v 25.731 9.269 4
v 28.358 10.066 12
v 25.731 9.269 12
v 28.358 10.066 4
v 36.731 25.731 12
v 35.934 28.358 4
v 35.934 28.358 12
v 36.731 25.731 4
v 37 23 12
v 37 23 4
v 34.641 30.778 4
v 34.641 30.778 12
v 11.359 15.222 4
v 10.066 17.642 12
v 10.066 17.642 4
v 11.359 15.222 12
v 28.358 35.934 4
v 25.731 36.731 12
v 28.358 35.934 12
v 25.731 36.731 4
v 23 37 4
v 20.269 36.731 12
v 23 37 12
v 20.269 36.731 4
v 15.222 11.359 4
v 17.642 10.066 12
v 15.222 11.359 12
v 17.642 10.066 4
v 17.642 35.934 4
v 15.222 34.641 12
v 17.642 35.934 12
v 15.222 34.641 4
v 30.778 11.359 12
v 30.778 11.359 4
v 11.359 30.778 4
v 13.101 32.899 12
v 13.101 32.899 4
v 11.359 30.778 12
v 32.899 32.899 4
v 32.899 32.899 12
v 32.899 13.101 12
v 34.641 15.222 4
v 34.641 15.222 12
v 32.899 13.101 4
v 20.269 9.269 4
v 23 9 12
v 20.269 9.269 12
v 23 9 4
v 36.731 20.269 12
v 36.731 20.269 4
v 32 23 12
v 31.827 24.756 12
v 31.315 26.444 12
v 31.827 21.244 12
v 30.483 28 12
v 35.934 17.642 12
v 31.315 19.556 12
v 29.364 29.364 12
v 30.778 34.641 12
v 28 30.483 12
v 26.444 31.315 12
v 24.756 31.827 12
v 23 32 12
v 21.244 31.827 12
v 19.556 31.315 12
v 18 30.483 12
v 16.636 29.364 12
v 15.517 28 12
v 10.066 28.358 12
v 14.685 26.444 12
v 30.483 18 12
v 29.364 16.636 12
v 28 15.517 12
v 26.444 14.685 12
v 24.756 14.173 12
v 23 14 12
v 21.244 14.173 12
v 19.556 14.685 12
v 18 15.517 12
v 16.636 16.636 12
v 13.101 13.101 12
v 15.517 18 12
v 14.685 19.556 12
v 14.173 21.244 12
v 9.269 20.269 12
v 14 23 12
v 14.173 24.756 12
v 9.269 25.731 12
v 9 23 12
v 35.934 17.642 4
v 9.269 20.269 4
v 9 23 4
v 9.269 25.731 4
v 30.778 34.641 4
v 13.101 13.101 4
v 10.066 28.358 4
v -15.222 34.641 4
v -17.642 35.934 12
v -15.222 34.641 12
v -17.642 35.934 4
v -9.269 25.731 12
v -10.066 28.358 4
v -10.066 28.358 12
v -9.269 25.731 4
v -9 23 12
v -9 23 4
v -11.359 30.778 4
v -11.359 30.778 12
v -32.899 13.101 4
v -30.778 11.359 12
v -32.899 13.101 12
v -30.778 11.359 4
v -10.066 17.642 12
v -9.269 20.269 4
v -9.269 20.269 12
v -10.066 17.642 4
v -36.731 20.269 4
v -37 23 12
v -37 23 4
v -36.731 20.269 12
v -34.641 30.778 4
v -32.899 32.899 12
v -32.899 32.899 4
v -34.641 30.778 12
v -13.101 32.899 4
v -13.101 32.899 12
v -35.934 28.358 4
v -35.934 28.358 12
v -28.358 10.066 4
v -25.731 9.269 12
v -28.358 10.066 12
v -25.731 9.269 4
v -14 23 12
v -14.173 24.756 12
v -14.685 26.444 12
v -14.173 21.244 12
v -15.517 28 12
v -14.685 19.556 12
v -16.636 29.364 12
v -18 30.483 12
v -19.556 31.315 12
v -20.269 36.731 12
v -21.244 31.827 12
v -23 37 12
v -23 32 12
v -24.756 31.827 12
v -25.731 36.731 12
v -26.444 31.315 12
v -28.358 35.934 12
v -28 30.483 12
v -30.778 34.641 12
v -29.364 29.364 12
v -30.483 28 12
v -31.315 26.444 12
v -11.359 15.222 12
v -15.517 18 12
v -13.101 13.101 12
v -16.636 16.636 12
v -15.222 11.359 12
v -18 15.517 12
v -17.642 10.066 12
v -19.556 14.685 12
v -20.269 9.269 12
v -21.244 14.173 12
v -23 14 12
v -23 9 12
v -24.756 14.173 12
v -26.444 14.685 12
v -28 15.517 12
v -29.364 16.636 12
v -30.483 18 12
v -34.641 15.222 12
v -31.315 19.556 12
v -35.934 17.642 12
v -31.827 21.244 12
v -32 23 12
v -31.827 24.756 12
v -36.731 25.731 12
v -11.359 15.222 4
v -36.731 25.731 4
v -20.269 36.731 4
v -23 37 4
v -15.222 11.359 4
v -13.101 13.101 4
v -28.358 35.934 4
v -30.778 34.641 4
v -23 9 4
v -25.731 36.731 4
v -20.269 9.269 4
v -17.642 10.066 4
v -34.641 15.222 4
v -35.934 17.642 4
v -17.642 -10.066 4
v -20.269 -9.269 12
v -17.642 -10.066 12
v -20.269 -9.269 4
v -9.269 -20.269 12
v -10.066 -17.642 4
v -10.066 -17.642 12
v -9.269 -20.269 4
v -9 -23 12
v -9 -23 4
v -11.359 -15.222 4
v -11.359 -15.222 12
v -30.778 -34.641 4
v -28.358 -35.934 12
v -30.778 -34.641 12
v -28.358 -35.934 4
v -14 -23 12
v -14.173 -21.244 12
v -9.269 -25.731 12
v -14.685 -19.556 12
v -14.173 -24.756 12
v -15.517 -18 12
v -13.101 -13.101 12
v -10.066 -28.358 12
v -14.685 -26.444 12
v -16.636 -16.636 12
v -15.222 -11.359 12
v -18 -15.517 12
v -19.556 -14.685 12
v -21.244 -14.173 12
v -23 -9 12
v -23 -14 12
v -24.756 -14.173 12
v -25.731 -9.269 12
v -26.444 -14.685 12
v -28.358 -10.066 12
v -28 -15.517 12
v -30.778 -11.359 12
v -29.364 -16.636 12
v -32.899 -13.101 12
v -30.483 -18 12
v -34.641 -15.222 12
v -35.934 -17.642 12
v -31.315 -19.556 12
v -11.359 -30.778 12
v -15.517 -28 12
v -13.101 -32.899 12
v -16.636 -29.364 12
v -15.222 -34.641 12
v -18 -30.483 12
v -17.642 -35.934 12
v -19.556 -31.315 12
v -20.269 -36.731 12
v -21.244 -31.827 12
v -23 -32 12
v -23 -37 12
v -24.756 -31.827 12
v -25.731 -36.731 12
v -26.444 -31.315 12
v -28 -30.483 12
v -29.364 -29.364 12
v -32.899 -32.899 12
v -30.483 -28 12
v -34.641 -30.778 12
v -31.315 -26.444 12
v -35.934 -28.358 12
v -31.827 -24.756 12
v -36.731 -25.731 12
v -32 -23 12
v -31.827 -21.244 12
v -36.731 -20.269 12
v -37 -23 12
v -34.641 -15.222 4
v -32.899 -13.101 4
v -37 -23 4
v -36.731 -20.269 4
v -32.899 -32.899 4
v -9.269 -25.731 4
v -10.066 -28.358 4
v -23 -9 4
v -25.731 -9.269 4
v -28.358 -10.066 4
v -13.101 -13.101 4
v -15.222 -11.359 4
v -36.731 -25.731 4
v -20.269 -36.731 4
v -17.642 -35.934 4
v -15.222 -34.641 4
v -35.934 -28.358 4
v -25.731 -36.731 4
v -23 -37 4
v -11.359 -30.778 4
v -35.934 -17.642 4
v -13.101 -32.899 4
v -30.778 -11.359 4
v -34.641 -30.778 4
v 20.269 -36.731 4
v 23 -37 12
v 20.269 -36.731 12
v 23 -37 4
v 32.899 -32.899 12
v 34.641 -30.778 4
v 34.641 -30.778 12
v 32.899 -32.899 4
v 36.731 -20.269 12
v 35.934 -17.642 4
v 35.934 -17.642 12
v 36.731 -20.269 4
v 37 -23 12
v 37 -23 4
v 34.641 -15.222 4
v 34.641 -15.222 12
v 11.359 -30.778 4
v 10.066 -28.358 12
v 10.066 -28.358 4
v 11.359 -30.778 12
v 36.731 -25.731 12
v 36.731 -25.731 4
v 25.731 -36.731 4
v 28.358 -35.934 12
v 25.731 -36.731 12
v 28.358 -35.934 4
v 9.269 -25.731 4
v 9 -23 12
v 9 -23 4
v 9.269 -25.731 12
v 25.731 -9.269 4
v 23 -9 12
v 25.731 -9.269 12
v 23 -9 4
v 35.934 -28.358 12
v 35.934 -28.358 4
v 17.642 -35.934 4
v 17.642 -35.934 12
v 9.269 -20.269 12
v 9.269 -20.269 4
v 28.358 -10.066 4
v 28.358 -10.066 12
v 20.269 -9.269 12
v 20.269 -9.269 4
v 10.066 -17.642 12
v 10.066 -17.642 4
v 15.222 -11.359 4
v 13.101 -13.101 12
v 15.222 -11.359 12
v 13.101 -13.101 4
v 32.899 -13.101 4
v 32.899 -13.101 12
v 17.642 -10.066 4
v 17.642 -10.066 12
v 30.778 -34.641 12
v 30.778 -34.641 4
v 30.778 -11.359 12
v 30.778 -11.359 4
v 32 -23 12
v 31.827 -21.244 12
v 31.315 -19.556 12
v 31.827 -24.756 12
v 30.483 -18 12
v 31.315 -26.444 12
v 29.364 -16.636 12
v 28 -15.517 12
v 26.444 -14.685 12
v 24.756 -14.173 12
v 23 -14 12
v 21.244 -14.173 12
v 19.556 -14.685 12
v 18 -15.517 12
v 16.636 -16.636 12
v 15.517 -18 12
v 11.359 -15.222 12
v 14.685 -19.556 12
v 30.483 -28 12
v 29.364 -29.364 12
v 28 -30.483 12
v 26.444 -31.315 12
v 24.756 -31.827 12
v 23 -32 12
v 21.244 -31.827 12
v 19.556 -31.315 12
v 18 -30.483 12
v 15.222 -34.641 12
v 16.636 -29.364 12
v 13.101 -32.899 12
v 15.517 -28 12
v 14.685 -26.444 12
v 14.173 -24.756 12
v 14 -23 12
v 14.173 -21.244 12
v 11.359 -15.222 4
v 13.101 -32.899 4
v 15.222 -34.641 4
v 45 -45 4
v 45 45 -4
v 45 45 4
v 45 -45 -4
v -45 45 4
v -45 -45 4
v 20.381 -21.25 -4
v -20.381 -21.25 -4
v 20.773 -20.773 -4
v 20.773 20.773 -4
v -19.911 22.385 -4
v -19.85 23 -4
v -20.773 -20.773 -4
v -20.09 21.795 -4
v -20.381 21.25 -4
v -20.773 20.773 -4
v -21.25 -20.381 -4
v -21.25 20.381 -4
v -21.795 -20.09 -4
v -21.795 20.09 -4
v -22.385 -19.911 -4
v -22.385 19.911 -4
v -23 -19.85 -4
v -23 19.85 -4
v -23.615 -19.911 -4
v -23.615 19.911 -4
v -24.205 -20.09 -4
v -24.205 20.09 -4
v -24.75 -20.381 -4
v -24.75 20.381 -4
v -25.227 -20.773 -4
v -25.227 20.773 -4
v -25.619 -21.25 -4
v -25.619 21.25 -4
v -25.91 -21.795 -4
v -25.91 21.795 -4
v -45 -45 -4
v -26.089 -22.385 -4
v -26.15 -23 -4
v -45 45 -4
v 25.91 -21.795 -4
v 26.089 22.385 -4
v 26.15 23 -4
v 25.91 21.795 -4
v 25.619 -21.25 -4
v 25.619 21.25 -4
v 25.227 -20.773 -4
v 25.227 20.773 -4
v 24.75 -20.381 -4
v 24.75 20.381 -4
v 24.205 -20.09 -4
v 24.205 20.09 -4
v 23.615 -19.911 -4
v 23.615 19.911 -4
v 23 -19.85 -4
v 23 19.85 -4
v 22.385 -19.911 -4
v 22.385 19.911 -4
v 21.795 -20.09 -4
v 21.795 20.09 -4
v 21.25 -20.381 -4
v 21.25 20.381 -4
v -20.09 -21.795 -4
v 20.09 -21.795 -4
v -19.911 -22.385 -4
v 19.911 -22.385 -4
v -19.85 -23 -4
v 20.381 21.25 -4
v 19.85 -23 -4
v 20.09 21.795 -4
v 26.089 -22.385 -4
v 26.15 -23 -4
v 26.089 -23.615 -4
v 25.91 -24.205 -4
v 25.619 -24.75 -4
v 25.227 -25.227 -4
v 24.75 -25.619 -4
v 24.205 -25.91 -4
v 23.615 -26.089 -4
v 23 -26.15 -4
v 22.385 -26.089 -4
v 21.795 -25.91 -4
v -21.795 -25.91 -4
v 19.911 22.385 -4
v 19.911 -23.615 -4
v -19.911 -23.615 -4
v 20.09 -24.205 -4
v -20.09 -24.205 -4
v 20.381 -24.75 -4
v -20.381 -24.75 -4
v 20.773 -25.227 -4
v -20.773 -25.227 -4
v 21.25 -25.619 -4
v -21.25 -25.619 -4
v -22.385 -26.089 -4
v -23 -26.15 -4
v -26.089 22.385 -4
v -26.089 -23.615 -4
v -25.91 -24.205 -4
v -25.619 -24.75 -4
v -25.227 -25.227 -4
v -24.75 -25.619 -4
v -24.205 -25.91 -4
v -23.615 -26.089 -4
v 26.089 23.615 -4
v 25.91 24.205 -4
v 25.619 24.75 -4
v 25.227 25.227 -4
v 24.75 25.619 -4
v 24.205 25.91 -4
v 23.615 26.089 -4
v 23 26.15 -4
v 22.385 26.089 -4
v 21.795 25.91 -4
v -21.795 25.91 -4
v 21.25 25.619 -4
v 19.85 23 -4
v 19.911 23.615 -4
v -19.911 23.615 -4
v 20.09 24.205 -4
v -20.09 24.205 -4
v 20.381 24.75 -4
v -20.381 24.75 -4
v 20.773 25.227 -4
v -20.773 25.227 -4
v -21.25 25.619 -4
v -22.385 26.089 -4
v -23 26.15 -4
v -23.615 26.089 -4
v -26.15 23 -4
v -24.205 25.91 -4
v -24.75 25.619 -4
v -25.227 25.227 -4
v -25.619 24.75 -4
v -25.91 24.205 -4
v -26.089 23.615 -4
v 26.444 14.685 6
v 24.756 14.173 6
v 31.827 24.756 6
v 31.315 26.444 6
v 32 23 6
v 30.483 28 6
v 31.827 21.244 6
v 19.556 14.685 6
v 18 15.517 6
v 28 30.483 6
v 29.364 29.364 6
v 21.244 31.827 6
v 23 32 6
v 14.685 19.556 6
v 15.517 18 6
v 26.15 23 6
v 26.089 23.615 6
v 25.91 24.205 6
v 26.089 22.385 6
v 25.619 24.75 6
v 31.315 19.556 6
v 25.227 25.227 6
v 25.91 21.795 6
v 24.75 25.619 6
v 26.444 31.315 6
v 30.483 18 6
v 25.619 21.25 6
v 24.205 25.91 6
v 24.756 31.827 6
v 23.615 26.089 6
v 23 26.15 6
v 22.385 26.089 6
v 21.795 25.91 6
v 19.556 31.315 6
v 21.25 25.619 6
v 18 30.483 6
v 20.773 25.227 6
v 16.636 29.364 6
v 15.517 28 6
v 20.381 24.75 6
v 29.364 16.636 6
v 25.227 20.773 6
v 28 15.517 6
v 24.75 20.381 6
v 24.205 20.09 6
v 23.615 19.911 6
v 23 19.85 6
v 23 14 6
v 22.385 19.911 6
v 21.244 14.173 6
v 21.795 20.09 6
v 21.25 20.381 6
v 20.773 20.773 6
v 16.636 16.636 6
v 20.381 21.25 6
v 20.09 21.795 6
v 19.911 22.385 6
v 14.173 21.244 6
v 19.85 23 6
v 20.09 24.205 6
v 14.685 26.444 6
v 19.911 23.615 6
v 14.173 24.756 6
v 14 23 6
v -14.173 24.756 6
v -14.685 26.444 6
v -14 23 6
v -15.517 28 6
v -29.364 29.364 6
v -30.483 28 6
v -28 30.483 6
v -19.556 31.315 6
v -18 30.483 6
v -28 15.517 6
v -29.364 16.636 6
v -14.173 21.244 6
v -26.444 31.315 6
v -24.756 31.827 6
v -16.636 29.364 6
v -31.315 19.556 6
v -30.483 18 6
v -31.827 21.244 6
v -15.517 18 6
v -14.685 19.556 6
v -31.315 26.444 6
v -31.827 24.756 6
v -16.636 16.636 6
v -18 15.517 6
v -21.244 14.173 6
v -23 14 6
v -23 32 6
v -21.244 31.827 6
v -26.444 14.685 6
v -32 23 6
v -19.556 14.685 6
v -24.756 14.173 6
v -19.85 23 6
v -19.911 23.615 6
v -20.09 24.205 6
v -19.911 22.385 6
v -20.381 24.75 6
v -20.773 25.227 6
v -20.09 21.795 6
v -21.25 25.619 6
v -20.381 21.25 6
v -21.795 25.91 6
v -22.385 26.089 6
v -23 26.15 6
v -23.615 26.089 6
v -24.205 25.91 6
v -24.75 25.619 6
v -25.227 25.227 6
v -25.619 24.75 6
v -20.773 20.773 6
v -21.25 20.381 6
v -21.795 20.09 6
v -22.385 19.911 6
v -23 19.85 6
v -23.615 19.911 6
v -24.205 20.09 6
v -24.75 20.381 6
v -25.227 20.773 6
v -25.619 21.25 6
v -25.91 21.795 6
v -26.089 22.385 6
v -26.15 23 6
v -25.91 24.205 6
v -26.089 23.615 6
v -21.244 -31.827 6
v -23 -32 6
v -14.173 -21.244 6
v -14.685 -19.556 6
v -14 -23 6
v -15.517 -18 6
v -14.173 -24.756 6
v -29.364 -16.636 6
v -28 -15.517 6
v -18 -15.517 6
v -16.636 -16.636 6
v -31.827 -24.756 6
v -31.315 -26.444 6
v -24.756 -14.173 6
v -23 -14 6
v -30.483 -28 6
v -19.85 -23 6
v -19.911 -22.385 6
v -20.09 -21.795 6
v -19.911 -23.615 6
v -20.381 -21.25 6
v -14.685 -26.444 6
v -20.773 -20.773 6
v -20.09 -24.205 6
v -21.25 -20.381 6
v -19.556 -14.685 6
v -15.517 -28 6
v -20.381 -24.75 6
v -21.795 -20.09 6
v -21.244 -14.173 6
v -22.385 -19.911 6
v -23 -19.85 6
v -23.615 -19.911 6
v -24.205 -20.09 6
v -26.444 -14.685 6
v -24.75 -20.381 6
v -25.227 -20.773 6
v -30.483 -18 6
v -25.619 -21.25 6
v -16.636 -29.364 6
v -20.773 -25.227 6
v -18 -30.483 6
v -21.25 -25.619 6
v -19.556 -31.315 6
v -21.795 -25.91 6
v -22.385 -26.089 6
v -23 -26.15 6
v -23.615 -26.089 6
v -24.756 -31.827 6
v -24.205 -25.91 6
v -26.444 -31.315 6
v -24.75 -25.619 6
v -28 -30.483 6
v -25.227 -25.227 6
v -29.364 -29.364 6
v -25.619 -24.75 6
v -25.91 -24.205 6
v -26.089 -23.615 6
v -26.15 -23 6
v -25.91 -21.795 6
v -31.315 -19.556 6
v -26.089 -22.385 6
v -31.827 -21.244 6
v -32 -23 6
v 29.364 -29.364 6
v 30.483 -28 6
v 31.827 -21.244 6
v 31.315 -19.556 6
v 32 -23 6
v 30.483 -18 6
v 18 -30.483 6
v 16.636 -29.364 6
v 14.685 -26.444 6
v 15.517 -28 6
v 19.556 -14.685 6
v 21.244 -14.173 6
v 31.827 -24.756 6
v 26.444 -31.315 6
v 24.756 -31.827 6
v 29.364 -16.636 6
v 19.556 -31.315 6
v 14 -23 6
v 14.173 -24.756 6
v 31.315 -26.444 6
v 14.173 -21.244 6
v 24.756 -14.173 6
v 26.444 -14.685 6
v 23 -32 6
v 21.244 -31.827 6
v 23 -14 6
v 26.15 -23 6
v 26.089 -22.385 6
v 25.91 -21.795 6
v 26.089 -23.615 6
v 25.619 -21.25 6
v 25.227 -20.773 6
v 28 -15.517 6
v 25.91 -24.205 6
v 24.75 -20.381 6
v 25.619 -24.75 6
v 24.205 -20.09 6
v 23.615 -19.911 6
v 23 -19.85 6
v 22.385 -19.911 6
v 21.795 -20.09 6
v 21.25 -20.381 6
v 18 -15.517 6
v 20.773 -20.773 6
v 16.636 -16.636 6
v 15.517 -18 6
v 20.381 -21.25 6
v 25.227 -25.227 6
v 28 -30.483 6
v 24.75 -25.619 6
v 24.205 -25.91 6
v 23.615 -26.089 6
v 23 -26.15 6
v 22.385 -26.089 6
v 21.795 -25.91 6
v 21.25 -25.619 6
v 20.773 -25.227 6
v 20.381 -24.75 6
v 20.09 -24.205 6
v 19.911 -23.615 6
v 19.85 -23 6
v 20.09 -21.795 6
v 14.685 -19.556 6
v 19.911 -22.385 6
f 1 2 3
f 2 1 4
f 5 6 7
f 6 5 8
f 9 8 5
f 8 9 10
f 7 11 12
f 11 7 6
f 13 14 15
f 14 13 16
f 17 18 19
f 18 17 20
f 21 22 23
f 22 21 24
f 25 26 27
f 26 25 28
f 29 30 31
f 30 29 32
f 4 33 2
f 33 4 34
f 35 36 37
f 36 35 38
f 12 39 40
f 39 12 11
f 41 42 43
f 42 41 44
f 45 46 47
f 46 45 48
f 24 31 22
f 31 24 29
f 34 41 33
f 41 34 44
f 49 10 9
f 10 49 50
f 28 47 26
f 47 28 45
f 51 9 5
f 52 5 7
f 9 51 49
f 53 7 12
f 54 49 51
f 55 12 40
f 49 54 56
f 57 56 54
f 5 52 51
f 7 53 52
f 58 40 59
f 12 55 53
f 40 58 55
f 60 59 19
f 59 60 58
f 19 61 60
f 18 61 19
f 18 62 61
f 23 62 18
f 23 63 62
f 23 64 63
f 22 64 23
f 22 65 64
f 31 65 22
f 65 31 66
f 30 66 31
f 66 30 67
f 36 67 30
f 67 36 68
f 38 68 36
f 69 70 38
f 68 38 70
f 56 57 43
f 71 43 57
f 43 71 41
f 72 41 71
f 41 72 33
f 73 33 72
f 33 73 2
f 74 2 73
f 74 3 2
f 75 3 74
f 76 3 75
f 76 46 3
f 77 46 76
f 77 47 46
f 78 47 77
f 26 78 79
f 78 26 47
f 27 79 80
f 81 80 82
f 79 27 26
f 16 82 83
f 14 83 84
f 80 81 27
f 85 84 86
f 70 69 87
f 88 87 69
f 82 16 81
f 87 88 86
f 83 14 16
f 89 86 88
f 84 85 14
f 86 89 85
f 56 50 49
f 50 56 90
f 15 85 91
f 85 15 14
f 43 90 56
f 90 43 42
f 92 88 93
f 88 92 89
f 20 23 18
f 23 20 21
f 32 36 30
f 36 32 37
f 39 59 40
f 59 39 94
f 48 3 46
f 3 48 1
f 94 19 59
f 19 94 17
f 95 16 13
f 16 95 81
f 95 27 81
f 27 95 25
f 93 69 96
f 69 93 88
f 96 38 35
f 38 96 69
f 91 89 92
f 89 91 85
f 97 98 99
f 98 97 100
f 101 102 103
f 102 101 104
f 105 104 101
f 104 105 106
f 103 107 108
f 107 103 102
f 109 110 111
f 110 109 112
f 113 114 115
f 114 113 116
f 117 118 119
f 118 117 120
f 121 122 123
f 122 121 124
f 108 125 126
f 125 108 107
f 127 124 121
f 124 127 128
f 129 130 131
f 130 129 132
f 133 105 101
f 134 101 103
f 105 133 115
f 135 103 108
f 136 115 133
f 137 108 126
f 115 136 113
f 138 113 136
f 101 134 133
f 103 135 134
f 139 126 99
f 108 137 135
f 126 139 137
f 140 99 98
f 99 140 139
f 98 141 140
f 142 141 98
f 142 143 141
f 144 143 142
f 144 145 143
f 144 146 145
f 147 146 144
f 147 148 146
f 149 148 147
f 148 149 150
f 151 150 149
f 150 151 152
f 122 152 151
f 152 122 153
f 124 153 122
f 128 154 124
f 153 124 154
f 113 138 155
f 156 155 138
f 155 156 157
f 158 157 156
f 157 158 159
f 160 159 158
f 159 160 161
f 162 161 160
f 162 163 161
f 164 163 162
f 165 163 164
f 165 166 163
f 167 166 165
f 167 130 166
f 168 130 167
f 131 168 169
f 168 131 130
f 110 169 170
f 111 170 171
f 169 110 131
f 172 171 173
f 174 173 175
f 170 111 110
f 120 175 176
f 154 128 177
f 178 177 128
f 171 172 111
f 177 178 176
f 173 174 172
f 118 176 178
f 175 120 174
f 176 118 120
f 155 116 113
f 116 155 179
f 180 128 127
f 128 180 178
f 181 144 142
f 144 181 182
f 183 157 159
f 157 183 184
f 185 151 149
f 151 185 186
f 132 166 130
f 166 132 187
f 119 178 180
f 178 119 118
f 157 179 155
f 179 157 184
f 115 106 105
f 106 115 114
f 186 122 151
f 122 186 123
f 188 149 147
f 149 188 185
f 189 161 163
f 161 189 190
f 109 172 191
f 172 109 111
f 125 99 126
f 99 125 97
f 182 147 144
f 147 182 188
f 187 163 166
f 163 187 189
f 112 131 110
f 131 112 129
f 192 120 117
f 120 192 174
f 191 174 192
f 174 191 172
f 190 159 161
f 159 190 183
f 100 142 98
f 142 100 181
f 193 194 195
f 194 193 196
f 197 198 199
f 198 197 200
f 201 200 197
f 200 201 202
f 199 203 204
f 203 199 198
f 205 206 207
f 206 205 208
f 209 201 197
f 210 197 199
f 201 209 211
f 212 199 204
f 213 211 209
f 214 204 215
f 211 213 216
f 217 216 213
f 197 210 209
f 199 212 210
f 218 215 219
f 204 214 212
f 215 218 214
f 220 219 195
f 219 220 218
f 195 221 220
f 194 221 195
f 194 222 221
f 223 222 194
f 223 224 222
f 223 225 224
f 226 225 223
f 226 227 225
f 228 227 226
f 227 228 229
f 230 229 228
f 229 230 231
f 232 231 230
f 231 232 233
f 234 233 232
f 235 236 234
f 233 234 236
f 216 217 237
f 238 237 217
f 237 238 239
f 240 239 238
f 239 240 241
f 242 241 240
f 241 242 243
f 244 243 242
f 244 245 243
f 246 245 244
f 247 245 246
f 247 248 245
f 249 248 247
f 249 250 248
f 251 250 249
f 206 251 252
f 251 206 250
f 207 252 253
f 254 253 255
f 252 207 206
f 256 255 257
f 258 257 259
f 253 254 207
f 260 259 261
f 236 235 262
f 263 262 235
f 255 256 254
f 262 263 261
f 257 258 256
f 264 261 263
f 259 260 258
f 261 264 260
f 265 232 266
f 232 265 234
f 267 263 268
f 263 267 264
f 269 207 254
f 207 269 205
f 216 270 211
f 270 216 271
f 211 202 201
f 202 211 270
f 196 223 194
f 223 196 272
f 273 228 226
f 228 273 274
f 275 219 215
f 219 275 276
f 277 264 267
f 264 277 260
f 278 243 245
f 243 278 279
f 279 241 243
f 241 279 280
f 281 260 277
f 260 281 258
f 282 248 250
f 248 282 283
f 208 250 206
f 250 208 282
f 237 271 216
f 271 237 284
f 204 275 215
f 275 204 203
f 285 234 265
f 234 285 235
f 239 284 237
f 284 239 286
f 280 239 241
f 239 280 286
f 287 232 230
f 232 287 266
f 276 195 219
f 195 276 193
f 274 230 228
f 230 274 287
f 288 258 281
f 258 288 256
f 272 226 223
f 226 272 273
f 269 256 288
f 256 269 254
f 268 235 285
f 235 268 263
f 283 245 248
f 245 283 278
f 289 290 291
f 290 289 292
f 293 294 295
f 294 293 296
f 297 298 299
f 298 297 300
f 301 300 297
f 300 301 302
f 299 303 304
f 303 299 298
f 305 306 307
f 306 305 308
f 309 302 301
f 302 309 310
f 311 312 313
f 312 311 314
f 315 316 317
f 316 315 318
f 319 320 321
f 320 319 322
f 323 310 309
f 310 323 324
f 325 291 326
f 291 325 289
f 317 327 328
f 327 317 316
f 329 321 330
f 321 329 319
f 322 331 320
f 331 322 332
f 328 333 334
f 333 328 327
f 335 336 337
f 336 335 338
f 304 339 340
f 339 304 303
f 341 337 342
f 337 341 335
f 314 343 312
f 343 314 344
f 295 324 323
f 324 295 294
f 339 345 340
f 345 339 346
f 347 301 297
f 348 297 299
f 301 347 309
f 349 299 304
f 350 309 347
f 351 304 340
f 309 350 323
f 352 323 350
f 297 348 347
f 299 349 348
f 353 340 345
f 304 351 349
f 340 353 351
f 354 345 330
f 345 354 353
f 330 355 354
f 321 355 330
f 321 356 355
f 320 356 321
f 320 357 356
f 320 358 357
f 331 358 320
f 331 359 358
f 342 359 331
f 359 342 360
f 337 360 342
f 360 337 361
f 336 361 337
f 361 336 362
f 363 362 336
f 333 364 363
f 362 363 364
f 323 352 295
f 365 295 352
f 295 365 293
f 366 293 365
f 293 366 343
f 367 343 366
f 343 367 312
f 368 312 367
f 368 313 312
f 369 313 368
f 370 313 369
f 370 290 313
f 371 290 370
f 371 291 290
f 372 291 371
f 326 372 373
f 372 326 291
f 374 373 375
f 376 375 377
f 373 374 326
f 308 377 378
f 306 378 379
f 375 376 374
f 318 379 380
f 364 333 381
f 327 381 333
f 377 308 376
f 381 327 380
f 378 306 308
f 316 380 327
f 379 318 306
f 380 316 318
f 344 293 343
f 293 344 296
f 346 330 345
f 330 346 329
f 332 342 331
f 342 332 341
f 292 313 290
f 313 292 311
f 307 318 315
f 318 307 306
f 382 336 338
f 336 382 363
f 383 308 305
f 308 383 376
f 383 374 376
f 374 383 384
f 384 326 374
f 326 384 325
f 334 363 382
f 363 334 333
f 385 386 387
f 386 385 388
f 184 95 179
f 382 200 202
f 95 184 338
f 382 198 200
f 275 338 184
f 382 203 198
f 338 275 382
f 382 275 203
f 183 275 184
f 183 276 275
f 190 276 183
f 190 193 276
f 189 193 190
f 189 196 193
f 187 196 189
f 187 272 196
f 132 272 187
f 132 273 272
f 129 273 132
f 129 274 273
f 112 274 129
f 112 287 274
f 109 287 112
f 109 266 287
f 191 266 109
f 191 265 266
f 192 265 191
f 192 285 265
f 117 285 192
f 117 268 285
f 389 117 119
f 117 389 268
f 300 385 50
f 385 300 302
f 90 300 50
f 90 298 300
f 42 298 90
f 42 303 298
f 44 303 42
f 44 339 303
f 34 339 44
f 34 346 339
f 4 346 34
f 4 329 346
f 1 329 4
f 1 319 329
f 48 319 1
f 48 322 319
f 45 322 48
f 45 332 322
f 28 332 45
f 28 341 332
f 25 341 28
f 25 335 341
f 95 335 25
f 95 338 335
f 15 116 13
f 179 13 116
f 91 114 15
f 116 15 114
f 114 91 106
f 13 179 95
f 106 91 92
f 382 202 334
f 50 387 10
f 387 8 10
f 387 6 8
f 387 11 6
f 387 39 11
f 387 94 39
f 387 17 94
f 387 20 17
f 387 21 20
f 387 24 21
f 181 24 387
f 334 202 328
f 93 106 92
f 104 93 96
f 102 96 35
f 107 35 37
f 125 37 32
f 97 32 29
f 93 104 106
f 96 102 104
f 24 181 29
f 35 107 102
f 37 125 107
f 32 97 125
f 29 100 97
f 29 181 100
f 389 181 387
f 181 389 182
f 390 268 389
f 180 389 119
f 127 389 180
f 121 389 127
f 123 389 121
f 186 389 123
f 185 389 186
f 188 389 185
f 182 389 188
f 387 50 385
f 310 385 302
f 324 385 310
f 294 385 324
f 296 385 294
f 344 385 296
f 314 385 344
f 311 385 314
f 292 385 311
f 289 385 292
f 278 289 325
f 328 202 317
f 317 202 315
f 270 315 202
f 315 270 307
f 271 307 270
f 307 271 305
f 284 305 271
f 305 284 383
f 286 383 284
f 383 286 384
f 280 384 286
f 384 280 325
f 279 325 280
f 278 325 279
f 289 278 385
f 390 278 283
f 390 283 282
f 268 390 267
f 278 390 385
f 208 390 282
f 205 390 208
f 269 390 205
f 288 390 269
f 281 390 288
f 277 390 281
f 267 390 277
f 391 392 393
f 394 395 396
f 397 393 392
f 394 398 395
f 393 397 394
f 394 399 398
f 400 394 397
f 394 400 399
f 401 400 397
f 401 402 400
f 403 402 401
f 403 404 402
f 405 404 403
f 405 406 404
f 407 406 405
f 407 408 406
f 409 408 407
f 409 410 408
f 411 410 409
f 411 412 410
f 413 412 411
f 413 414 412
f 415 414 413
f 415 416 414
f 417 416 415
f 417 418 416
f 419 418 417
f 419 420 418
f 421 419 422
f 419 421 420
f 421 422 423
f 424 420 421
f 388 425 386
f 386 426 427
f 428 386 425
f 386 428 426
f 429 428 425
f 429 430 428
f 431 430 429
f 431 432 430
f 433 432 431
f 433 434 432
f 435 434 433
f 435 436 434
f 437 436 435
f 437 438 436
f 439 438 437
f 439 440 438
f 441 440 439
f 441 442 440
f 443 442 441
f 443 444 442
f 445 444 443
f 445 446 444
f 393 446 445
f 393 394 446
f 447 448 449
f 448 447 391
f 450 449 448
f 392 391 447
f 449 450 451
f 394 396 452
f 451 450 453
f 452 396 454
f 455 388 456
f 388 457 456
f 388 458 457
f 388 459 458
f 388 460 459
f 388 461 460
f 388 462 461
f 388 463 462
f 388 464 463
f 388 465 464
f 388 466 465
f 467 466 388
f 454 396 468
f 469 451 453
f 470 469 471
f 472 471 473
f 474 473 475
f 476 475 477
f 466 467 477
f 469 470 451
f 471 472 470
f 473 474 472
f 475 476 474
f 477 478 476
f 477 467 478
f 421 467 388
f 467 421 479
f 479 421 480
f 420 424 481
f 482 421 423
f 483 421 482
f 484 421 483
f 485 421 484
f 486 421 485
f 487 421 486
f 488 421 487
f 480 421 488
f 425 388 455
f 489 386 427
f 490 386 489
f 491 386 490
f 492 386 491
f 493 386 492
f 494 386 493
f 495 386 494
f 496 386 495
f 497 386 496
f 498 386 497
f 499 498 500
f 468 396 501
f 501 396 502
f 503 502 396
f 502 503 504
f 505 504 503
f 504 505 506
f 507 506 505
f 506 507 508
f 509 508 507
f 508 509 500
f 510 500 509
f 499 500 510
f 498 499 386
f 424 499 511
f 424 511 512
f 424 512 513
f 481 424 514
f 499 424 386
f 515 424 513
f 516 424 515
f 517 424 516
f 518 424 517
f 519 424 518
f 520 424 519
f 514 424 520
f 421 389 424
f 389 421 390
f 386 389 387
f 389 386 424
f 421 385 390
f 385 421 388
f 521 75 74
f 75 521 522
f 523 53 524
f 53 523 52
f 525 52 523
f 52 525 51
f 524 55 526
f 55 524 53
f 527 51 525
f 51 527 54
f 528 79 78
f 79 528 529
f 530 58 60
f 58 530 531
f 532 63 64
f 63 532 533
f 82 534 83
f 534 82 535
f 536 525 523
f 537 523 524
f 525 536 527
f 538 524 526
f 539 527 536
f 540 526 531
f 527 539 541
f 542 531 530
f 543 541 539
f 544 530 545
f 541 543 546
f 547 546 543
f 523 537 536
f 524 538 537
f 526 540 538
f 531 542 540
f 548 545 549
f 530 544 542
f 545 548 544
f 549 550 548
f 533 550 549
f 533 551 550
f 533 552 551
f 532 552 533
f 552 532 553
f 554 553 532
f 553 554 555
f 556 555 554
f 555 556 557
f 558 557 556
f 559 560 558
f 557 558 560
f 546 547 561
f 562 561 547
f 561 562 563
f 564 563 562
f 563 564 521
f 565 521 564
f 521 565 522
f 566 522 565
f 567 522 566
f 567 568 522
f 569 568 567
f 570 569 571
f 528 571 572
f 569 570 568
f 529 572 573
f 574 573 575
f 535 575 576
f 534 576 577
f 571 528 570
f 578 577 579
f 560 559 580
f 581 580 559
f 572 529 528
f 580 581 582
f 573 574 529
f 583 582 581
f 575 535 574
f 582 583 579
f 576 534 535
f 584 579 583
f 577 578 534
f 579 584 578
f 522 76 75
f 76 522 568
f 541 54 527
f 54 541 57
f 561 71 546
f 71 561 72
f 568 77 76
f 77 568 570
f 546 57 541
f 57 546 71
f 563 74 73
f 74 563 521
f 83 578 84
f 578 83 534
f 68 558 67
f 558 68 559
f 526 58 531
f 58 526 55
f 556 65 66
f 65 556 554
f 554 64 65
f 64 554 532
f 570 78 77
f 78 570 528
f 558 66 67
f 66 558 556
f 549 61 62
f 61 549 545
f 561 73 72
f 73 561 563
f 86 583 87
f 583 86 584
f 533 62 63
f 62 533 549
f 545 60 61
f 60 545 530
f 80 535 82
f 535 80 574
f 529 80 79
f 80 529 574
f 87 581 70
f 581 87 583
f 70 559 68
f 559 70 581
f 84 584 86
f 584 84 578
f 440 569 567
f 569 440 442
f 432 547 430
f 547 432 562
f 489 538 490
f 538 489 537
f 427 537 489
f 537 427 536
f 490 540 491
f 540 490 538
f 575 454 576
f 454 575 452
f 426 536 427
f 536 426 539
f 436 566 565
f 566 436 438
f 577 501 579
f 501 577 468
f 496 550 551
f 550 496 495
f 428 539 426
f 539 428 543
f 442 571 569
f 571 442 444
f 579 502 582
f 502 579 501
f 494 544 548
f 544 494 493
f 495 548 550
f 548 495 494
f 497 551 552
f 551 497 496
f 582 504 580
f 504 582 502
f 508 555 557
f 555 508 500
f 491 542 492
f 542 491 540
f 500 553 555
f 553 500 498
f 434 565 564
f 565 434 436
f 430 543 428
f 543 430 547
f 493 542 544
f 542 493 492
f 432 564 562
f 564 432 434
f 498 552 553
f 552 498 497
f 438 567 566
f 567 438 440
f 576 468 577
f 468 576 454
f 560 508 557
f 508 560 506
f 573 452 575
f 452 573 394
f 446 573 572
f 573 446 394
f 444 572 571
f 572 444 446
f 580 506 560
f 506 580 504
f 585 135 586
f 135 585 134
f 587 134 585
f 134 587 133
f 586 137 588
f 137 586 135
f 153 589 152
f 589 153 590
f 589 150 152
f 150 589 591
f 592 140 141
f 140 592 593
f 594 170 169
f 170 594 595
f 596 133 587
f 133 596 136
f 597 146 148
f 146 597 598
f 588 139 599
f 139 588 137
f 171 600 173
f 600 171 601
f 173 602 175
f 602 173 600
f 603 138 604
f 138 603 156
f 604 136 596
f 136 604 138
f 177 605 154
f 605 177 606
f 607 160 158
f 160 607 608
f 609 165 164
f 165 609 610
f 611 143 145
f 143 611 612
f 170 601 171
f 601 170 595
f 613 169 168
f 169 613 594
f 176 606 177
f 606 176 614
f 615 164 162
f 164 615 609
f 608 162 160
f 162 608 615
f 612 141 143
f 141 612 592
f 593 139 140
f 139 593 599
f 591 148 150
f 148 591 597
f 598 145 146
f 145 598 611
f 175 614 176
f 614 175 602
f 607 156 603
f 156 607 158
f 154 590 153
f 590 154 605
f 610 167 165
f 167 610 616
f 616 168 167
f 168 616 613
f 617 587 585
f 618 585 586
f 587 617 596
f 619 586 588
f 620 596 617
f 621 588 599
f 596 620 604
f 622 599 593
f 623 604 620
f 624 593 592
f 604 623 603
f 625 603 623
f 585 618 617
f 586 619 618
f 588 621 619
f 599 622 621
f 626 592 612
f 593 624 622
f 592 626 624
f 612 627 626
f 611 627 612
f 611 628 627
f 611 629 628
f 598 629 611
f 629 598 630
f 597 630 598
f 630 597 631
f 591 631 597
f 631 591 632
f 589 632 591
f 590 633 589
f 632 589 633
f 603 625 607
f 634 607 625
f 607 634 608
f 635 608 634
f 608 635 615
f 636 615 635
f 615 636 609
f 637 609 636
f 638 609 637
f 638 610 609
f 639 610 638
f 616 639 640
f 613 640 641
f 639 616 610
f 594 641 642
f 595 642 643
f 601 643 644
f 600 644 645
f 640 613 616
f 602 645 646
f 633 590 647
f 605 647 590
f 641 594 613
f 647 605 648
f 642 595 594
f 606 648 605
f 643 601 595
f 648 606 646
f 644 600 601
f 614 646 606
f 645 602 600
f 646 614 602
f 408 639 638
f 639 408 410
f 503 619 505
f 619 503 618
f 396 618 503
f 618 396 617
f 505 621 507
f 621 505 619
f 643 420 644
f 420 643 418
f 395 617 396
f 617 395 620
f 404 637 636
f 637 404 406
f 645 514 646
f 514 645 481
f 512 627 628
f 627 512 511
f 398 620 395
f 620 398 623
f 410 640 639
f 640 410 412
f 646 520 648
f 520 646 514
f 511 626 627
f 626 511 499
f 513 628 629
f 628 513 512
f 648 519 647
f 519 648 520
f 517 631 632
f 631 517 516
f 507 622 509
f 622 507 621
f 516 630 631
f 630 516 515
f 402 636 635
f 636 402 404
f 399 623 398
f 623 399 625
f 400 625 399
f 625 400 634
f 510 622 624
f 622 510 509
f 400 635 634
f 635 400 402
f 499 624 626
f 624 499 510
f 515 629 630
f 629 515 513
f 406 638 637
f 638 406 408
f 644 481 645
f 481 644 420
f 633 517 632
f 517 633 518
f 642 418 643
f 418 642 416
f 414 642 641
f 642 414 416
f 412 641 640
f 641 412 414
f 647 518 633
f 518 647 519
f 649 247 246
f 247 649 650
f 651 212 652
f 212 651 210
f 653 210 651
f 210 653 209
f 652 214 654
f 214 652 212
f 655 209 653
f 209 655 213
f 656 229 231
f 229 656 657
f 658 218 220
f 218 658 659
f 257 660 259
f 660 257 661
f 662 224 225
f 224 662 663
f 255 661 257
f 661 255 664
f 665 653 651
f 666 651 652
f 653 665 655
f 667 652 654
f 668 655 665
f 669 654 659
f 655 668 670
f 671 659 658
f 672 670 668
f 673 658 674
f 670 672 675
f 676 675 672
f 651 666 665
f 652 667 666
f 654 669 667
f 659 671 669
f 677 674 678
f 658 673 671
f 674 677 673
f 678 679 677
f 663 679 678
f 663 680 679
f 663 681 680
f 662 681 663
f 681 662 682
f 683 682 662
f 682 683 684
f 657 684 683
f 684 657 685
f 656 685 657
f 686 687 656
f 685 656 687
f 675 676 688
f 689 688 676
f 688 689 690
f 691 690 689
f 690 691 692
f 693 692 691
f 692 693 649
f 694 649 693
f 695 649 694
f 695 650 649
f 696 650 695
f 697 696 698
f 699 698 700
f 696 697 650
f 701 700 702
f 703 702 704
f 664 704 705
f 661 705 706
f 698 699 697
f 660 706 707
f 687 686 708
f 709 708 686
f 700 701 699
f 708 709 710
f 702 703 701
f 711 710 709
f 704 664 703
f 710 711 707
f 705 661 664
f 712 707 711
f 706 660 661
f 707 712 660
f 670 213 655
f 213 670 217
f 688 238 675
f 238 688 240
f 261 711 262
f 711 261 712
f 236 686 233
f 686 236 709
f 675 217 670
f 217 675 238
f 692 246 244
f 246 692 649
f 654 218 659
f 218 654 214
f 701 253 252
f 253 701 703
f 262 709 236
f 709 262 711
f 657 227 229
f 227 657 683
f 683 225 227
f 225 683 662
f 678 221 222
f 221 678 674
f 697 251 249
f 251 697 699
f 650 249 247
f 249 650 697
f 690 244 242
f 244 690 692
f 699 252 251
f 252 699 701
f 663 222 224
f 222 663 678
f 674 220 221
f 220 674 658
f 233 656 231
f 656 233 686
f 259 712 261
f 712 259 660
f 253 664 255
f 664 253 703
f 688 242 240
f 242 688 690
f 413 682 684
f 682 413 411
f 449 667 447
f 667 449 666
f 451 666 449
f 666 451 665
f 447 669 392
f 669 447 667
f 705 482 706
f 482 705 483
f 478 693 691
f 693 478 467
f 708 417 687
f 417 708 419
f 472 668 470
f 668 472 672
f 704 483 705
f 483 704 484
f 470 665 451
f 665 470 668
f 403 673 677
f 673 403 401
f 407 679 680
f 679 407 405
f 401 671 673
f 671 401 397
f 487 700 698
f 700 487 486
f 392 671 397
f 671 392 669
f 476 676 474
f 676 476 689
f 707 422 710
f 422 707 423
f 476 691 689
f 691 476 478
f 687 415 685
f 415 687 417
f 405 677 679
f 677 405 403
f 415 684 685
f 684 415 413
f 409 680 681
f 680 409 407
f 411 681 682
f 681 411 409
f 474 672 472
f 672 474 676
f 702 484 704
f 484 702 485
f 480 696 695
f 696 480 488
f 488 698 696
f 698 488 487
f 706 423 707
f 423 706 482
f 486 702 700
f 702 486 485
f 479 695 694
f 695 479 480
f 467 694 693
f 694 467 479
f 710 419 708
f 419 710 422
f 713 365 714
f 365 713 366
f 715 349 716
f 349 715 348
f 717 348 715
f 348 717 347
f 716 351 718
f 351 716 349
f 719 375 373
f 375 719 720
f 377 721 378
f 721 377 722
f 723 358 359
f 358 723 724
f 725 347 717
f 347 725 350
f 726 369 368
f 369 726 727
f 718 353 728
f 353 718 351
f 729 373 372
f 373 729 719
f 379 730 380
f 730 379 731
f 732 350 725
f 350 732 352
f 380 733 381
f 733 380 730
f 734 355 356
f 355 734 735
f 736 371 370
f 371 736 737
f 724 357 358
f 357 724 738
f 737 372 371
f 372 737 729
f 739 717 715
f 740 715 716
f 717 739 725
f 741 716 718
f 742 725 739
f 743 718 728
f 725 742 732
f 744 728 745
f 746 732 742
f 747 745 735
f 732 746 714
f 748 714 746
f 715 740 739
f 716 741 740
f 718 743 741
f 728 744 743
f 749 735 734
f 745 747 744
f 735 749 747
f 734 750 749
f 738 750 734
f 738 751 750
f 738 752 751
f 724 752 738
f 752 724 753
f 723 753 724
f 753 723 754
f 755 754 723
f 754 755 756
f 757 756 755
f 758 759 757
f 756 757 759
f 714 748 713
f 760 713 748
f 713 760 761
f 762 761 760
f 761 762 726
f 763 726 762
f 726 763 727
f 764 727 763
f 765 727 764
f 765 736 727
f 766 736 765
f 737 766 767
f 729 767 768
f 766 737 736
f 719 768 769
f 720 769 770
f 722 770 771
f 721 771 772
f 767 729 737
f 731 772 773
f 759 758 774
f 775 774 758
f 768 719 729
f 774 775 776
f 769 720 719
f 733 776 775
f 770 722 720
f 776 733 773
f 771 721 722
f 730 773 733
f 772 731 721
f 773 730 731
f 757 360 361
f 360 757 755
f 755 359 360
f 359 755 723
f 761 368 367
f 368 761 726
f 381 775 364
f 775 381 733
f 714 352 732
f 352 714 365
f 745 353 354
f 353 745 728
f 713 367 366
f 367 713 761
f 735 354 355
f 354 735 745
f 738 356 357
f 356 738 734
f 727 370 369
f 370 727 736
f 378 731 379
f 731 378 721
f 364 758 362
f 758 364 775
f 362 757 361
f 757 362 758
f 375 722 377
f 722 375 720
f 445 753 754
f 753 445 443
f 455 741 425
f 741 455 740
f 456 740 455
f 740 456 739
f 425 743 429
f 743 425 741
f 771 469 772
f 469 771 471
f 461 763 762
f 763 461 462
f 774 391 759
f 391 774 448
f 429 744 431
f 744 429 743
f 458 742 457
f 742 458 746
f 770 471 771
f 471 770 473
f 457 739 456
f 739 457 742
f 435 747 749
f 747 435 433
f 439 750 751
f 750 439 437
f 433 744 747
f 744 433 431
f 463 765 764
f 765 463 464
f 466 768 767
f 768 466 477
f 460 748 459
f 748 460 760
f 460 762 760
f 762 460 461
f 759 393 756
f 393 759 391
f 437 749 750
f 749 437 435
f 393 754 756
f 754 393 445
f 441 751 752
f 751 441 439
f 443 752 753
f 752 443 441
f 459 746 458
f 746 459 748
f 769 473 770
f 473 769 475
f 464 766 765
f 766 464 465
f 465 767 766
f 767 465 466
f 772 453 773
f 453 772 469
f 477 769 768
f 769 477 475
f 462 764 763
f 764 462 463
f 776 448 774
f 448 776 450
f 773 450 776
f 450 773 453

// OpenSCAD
$fn = 32;

// ----------------------------------------------------------------------
// Socket pad plate
// bosses with counterbored sockets for the screws
// ----------------------------------------------------------------------

// --- parameters (mm) ---
base_t = 8;           // base plate thickness
boss_h = 8;           // boss height above the base plate
boss_d = 28;          // boss diameter
socket_d = 18;        // socket diameter
socket_depth = 6;     // socket depth from the boss face
bolt_d = 6.3;         // screw clearance hole through the socket floor
plate = [90, 90, 8];  // overall size (x, y, z)
edge = 22;            // boss centre offset from the plate edge
pads = 4;             // boss count, one per corner

// --- derived feature positions (mm) ---
height = base_t + boss_h;        // = 16   overall height of the part
corner_x = plate[0] / 2 - edge;  // = 23   boss centre X
corner_y = plate[1] / 2 - edge;  // = 23   boss centre Y
feature_centers = [
  [corner_x, corner_y],
  [-corner_x, corner_y],
  [-corner_x, -corner_y],
  [corner_x, -corner_y]
];   // boss centres: sockets, holes and the pads themselves are placed from here

// base plate, bosses on feature_centers, socket + through hole in each
difference() {
  union() {
    cube(plate, center = true);
    for (centre = feature_centers)
      translate([centre[0], centre[1], plate[2] / 2 - 1])
        cylinder(d = boss_d, h = boss_h + 1);
  }
  for (centre = feature_centers) {
    translate([centre[0], centre[1], plate[2] / 2 + boss_h - socket_depth])
      cylinder(d = socket_d, h = socket_depth + 1);
    translate([centre[0], centre[1], -height])
      cylinder(d = bolt_d, h = 2 * height + 2);  // through the socket floor
  }
}
